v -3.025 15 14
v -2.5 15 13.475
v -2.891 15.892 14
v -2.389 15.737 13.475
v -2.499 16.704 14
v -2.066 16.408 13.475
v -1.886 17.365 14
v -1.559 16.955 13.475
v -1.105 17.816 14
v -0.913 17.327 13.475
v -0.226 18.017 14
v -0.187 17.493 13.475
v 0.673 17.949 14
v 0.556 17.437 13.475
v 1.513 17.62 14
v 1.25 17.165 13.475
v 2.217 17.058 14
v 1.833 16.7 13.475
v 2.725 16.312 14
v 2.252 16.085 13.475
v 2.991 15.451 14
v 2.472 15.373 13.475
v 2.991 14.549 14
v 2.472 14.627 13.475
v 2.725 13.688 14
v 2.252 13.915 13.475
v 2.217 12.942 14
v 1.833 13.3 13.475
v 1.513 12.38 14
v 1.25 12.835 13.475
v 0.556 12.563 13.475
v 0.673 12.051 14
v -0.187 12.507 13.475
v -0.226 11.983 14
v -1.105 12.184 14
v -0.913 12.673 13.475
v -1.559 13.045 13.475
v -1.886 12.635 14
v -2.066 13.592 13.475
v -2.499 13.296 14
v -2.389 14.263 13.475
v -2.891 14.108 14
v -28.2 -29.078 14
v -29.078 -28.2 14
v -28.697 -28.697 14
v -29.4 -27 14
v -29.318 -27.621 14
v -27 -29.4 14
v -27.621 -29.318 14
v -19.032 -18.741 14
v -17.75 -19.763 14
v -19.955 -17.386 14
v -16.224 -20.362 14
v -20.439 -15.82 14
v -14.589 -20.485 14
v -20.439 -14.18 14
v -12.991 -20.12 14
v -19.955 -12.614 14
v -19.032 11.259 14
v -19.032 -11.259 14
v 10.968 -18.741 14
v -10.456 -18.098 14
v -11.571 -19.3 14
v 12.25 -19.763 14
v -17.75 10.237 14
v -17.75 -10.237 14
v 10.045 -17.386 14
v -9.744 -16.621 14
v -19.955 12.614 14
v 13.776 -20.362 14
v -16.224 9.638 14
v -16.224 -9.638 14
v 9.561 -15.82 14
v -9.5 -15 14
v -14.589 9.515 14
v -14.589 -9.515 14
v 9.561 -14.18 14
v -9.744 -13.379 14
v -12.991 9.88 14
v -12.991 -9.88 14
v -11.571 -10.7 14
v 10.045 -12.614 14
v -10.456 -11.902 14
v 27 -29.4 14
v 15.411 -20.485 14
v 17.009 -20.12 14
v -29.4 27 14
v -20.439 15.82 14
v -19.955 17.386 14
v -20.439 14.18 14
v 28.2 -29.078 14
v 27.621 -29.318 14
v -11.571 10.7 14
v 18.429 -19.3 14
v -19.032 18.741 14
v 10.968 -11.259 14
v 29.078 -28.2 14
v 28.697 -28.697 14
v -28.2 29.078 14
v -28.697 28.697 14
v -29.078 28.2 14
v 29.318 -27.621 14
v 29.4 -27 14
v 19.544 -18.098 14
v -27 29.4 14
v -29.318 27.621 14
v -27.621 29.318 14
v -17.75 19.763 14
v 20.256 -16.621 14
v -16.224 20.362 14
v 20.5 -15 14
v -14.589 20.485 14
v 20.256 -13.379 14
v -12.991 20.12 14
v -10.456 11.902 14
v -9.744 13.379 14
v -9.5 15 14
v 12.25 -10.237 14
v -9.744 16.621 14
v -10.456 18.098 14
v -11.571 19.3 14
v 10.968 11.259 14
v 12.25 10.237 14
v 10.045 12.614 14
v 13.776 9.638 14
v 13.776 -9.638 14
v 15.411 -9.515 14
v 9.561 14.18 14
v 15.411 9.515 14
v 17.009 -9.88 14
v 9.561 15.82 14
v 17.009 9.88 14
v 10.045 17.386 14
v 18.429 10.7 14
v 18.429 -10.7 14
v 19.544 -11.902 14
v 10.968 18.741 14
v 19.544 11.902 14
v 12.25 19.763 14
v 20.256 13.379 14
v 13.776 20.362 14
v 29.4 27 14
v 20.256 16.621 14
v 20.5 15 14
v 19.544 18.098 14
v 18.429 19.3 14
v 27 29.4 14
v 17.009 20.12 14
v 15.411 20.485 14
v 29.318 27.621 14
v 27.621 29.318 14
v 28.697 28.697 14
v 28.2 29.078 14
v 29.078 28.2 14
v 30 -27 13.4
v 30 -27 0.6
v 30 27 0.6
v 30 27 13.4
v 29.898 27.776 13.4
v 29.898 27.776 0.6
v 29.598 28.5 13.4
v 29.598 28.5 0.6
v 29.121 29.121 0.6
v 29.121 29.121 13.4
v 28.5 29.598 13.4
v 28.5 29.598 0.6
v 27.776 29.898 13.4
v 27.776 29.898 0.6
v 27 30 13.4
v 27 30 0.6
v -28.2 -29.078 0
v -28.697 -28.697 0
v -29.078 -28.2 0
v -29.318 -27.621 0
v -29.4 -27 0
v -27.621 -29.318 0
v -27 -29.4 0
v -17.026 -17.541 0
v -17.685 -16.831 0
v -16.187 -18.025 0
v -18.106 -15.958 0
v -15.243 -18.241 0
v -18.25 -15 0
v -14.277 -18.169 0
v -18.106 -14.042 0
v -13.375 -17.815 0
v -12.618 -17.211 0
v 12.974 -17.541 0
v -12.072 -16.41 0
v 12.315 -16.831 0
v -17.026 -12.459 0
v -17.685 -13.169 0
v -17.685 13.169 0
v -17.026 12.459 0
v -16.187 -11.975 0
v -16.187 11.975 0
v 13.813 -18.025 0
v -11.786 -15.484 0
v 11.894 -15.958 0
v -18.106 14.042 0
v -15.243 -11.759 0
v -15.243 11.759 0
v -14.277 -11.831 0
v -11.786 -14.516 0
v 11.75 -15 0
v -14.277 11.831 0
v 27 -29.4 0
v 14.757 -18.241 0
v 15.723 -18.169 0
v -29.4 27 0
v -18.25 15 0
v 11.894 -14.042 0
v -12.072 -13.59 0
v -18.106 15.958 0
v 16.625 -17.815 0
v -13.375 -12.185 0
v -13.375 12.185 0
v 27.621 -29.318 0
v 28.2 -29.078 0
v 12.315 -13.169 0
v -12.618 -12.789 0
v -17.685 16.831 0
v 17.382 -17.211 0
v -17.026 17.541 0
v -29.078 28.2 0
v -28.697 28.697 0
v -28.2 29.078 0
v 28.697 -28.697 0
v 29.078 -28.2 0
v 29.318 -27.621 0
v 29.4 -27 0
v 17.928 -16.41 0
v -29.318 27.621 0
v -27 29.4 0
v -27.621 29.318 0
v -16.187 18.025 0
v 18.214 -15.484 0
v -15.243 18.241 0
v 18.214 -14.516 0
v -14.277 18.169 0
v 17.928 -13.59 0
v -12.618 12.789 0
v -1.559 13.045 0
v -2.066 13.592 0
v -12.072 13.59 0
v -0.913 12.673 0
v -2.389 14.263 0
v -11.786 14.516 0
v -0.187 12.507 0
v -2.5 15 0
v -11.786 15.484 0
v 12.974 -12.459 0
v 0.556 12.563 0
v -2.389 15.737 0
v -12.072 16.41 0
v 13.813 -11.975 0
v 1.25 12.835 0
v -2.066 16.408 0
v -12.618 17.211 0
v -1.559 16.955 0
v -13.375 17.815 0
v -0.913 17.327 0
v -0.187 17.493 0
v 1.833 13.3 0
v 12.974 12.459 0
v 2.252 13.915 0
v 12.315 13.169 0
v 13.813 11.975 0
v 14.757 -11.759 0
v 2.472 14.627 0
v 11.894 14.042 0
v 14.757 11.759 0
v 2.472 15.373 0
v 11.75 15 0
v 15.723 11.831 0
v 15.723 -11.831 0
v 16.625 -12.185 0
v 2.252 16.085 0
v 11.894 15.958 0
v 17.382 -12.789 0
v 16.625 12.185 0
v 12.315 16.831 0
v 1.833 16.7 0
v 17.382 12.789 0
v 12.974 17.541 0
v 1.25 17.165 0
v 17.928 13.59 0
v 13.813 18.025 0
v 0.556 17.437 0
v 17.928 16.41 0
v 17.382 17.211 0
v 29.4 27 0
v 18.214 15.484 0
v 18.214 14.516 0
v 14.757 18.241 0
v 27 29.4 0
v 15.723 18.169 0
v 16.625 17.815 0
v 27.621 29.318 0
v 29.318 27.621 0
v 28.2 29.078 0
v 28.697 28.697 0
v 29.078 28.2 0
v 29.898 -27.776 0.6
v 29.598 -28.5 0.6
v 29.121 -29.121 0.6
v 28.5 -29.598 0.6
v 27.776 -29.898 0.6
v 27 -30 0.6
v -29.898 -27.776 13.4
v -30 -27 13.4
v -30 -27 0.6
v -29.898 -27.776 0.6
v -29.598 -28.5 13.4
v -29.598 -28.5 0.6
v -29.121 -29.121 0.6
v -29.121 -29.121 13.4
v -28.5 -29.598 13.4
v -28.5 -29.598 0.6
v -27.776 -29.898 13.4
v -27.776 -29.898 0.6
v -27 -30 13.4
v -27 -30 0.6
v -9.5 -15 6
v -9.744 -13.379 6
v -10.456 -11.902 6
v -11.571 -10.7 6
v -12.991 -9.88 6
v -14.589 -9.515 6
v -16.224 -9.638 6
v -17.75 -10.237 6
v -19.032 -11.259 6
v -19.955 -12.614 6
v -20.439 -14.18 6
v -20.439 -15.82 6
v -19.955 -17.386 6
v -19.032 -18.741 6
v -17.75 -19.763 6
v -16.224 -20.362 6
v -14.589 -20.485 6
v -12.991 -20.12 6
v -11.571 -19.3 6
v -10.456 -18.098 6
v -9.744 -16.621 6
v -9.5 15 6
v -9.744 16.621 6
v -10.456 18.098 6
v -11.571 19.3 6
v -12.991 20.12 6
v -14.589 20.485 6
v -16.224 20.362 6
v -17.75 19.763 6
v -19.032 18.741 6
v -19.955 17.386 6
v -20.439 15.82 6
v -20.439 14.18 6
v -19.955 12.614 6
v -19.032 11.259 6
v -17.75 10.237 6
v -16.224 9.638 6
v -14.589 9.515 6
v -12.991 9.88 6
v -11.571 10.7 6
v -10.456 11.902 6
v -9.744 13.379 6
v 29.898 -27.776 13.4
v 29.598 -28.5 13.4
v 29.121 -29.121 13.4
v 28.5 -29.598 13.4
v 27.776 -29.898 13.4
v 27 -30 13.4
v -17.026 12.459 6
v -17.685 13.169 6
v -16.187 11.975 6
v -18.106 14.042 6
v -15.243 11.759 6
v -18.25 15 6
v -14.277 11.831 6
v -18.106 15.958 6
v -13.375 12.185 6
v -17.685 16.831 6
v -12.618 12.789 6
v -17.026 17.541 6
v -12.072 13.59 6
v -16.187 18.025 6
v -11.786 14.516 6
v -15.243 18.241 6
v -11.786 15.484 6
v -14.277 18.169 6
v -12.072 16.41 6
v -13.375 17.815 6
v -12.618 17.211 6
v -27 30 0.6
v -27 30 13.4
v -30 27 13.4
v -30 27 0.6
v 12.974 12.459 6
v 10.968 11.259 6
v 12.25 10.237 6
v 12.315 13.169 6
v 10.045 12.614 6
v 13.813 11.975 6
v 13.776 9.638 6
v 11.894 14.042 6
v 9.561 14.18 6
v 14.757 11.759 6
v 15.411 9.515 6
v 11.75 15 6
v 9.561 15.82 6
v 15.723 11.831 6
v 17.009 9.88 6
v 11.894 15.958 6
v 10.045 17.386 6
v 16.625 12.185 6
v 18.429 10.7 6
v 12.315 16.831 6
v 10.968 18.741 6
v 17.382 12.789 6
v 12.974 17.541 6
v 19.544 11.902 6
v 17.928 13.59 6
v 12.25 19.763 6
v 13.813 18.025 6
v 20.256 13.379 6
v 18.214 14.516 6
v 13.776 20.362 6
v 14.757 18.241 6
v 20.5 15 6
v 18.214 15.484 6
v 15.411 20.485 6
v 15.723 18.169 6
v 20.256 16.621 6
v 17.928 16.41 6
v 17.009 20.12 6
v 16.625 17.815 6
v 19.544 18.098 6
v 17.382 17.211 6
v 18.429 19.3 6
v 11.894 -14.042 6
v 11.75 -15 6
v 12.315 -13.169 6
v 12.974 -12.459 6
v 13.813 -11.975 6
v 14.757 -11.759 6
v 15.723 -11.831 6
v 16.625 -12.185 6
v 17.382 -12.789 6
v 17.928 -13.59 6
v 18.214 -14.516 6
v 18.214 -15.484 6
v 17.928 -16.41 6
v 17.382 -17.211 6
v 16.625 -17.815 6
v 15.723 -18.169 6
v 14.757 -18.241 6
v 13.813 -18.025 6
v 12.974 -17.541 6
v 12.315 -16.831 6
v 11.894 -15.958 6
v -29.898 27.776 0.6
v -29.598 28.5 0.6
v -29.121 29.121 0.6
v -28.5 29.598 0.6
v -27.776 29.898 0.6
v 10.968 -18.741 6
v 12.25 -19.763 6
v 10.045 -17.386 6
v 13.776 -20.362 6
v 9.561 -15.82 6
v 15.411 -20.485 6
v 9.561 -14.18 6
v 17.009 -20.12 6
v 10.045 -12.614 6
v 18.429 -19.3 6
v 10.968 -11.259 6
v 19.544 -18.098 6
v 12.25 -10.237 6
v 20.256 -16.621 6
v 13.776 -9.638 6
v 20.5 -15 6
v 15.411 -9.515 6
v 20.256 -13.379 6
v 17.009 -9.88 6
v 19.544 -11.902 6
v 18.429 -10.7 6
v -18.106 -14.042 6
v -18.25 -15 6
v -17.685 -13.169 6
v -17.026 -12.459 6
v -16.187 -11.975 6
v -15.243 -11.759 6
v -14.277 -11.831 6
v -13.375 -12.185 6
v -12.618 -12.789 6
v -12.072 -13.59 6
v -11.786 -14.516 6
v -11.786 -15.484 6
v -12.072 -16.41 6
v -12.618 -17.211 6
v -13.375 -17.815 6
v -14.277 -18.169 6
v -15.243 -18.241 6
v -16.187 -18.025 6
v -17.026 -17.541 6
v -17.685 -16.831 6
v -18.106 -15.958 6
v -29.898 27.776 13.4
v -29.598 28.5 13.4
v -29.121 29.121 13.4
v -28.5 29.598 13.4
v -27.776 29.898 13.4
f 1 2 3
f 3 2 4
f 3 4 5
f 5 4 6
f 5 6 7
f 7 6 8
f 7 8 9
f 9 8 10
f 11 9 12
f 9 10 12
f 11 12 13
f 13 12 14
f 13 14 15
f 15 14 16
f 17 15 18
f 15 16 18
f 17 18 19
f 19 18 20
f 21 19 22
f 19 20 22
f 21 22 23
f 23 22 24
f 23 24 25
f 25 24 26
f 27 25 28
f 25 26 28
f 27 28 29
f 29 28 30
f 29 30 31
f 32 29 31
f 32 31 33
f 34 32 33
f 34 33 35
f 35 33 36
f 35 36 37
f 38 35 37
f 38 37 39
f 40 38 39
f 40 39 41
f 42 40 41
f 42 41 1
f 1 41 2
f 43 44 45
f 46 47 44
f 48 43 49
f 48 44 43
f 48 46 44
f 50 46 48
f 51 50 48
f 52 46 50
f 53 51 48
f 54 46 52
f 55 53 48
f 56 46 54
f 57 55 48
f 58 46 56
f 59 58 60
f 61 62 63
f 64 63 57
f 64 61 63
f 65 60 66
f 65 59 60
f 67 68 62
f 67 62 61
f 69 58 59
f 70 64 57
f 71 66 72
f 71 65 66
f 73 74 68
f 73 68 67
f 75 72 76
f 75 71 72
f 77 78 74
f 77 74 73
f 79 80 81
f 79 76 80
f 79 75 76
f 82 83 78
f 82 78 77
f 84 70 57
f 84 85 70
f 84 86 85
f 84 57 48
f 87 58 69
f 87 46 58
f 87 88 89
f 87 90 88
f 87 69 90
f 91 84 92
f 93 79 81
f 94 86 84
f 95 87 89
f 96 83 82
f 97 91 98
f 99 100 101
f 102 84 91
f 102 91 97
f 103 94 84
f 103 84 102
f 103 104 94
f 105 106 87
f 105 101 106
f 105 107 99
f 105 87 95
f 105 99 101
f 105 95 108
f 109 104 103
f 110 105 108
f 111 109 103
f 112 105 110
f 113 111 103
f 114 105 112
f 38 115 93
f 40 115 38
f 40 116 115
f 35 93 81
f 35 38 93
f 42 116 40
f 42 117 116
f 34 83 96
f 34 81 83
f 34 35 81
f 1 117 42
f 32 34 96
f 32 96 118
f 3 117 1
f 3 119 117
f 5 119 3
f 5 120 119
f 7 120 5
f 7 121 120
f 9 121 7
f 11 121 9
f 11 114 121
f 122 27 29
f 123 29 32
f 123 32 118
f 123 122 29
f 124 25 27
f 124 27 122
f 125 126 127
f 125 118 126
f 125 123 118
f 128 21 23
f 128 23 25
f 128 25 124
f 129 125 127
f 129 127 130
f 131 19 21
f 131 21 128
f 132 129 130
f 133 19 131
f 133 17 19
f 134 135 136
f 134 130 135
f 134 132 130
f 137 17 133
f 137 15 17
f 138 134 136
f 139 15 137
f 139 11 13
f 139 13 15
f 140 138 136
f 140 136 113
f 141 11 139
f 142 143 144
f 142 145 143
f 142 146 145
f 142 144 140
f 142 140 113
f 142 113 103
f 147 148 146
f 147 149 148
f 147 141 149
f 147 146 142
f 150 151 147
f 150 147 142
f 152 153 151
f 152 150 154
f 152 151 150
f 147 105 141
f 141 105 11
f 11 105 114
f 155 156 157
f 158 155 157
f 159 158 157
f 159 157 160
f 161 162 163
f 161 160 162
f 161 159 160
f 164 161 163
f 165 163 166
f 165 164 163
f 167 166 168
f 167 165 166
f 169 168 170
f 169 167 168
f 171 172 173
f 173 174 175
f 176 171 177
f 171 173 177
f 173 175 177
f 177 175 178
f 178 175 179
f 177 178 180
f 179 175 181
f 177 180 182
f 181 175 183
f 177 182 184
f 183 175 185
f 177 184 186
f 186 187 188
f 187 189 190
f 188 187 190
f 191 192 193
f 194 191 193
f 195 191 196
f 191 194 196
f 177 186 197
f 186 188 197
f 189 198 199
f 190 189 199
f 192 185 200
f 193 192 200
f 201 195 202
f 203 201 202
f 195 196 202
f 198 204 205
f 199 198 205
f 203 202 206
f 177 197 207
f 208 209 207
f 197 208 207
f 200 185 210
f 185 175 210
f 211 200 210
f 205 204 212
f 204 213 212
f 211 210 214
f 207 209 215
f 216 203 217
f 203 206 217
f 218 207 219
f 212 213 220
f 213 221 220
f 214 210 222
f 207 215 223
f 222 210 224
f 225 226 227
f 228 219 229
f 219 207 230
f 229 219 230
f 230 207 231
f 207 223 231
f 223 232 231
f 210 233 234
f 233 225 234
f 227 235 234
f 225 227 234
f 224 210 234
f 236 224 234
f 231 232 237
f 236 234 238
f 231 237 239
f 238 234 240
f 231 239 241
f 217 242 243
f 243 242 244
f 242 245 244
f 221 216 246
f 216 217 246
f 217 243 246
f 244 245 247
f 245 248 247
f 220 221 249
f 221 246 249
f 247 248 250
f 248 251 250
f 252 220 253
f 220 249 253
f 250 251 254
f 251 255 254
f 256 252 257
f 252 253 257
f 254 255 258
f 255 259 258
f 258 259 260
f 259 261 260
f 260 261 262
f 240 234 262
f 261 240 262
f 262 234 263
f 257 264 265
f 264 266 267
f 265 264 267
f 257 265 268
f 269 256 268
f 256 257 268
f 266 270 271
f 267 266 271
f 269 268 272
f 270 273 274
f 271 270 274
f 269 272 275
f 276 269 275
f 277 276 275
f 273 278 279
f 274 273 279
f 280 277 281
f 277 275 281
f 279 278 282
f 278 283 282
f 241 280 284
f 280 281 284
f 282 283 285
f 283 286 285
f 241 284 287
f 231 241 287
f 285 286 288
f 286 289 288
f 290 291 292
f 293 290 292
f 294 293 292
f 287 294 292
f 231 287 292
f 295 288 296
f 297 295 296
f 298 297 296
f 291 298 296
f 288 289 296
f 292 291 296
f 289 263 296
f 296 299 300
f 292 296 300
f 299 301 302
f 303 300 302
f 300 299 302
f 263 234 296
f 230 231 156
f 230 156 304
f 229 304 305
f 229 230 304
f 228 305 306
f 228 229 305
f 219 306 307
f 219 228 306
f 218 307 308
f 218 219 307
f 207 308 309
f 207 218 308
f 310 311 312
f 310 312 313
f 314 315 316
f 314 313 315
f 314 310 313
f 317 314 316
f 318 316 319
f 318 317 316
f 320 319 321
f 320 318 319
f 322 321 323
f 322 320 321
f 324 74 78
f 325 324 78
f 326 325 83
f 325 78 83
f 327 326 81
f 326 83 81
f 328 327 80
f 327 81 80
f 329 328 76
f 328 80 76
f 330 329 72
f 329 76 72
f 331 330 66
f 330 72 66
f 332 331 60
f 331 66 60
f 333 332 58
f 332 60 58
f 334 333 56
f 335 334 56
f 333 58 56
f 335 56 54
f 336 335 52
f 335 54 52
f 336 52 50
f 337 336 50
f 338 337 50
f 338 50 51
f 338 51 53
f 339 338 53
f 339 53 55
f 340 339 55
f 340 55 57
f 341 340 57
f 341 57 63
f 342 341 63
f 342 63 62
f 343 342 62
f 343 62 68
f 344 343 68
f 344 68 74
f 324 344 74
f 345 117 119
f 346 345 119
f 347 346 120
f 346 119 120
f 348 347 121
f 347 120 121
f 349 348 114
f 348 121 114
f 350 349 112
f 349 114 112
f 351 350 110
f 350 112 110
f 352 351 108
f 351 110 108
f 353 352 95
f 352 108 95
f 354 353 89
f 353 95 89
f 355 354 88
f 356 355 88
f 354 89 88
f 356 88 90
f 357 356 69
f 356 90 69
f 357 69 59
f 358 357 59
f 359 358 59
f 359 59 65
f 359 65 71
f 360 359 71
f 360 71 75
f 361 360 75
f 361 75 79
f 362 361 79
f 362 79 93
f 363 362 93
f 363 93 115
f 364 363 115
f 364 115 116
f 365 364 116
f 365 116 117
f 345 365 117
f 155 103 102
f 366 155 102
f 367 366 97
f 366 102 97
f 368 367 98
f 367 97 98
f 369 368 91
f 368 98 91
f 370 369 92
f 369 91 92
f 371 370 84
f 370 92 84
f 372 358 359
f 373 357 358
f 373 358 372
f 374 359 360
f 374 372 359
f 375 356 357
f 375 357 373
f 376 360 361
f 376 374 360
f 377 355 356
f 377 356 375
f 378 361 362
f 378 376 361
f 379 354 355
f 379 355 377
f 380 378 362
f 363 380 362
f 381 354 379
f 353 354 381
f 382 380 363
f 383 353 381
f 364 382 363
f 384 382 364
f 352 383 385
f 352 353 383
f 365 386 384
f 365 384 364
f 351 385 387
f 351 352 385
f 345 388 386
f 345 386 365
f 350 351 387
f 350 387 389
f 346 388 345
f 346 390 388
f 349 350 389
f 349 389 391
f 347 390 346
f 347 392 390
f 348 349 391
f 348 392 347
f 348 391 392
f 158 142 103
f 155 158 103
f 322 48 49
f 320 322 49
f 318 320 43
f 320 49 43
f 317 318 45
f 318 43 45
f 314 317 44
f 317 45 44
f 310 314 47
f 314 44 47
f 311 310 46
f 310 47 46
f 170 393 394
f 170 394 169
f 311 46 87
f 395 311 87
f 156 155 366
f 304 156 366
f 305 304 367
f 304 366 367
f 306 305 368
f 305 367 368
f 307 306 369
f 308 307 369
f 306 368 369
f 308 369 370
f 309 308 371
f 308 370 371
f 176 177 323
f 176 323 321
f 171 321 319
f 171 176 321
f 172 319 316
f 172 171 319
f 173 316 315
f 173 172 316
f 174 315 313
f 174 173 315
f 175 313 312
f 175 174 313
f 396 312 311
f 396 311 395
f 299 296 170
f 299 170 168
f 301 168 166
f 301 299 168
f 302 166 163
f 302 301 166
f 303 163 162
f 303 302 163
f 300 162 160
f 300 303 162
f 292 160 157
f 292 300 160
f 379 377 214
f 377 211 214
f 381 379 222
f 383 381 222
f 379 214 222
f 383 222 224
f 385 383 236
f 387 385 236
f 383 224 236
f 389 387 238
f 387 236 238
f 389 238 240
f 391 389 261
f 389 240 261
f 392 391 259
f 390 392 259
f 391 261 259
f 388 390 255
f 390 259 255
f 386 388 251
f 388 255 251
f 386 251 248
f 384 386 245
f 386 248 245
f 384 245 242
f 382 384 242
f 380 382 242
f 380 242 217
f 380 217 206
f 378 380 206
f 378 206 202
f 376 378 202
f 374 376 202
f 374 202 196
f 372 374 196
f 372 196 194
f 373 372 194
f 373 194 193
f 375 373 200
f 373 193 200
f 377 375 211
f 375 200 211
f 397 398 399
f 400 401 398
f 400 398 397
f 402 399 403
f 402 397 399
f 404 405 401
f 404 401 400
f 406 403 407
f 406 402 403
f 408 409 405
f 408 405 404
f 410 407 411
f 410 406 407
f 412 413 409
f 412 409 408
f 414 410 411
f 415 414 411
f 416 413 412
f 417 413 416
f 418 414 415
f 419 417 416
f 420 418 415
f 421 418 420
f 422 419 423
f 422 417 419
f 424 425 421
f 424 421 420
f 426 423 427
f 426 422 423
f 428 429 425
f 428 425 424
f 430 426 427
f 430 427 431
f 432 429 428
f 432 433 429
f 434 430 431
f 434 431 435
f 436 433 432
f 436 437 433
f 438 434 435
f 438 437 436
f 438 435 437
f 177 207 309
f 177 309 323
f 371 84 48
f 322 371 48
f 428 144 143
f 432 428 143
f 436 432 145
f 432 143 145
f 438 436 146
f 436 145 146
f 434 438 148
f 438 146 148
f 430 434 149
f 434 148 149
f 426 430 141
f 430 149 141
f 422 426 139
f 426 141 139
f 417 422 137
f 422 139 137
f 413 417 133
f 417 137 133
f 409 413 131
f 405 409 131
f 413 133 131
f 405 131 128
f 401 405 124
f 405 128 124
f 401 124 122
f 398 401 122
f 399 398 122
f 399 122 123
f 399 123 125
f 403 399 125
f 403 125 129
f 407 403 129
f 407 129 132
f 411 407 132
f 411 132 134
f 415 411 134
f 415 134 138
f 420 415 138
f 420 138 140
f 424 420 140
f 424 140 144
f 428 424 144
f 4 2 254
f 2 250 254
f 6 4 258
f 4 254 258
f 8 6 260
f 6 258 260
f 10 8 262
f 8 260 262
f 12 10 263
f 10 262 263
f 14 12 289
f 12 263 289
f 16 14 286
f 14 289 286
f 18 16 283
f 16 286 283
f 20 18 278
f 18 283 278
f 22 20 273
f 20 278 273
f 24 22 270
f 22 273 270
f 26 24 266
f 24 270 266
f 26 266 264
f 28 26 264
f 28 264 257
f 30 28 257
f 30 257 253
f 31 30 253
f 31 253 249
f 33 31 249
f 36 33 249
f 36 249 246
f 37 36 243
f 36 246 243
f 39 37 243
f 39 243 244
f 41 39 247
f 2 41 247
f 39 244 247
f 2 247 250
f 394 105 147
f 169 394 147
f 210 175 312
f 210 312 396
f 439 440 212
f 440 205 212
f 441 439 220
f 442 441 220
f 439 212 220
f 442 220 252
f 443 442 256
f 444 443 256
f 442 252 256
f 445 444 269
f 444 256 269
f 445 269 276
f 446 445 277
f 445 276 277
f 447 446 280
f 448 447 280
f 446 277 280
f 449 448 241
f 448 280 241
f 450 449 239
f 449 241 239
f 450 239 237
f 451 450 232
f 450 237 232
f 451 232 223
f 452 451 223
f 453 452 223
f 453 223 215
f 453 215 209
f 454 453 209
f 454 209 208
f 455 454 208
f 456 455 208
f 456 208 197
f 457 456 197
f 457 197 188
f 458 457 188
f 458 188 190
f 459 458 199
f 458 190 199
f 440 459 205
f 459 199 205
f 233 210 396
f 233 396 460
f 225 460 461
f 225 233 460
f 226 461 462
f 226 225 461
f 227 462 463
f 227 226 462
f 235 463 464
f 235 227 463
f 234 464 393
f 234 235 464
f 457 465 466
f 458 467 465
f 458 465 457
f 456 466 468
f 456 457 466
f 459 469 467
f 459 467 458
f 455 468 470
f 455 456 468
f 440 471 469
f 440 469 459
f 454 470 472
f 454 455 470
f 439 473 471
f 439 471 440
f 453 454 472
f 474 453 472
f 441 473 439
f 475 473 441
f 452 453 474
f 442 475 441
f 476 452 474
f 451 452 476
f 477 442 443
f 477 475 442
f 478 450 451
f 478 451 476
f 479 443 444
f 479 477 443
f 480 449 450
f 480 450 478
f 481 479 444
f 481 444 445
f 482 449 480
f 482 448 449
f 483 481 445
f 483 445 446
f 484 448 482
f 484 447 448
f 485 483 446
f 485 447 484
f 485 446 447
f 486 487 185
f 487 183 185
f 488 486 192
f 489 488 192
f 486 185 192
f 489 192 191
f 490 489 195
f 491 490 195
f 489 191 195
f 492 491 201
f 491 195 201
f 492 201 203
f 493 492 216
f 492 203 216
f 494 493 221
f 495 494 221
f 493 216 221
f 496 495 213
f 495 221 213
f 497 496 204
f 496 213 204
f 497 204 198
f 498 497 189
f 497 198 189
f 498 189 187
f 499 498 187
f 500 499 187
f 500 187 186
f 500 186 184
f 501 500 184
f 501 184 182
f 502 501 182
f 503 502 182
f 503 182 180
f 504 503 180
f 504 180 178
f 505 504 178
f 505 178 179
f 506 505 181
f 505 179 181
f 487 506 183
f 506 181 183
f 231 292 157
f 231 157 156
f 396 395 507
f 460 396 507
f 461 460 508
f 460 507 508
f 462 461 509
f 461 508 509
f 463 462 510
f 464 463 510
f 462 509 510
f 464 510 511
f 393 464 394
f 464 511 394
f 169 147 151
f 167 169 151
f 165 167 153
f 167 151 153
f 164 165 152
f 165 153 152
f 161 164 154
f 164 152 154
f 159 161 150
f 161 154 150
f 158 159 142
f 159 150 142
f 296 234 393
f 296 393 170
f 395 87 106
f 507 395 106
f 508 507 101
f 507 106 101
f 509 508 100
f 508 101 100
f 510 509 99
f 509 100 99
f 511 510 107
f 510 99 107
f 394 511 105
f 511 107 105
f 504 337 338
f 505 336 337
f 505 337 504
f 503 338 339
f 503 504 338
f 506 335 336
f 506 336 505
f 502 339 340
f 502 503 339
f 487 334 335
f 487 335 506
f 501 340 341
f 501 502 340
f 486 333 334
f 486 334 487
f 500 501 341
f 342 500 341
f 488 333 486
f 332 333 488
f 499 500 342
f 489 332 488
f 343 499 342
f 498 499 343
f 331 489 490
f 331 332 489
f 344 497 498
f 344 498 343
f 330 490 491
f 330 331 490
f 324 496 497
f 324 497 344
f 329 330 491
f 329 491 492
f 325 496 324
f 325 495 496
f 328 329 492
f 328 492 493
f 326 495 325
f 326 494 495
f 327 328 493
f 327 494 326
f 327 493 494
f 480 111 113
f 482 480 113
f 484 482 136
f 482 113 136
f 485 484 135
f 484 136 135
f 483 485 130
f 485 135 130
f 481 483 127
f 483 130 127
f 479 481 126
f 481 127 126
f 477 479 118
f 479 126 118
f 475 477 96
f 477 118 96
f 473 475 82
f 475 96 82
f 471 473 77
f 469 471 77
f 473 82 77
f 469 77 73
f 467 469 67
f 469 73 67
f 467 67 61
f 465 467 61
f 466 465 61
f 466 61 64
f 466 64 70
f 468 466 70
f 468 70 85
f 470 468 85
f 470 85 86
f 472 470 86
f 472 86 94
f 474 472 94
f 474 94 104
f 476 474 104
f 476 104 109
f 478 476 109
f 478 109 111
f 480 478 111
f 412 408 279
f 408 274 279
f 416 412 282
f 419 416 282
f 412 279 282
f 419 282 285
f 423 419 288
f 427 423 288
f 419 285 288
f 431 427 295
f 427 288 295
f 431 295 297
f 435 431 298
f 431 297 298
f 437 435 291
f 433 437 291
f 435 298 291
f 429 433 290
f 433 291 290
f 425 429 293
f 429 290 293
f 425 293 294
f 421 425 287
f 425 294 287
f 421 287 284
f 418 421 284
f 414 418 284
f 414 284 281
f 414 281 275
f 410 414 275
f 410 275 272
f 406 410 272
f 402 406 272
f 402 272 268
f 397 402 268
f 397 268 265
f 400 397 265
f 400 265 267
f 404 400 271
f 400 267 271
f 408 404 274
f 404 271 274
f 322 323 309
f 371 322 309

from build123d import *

# Parameters (mm, degrees)
SKETCH1_W                                           = 60
SKETCH1_H                                           = 60
BOSS_EXTRUDE1_DEPTH                                 = 14
CBORE_FOR_M6_HEX_SOCKET_HEAD_CAP_SCREW1_D           = 6.5
CBORE_FOR_M6_HEX_SOCKET_HEAD_CAP_SCREW1_CBORE_D     = 11
CBORE_FOR_M6_HEX_SOCKET_HEAD_CAP_SCREW1_CBORE_DEPTH = 8
M6_TAPPED_HOLE1_D                                   = 5
M6_TAPPED_HOLE1_CSINK_D                             = 6.05
M6_TAPPED_HOLE1_CSINK_ANGLE                         = 90
FILLET1_R                                           = 3
CHAMFER1_SIZE                                       = 0.6


with BuildPart() as part:
    # Sketch1 → Boss-Extrude1 (new body)
    with BuildSketch(Plane.XY):
        Rectangle(SKETCH1_W, SKETCH1_H)
    extrude(amount=BOSS_EXTRUDE1_DEPTH)

    # CBORE for M6 Hex Socket Head Cap Screw1 (through all)
    with Locations(Plane.XY.offset(14)):
        with Locations((-15, 15), (15, 15), (15, -15), (-15, -15)):
            CounterBoreHole(CBORE_FOR_M6_HEX_SOCKET_HEAD_CAP_SCREW1_D / 2, CBORE_FOR_M6_HEX_SOCKET_HEAD_CAP_SCREW1_CBORE_D / 2, CBORE_FOR_M6_HEX_SOCKET_HEAD_CAP_SCREW1_CBORE_DEPTH)

    # M6 Tapped Hole1 (through all)
    with Locations(Plane.XY.offset(14)):
        with Locations((0, 15)):
            CounterSinkHole(M6_TAPPED_HOLE1_D / 2, M6_TAPPED_HOLE1_CSINK_D / 2, counter_sink_angle=M6_TAPPED_HOLE1_CSINK_ANGLE)

    # Fillet1
    fillet1_edges = [part.edges().sort_by_distance(p)[0] for p in [
        (-30, 30, 7),
        (30, 30, 7),
        (30, -30, 7),
        (-30, -30, 7),
    ]]
    fillet(fillet1_edges, radius=FILLET1_R)

    # Chamfer1
    chamfer1_edges = [part.edges().sort_by_distance(p)[0] for p in [
        (-30, 0, 0),
        (-30, 0, 14),
        (0, 30, 0),
        (30, 0, 0),
        (0, -30, 0),
        (-29.121320344, -29.121320344, 0),
        (29.121320344, -29.121320344, 0),
        (29.121320344, 29.121320344, 0),
        (-29.121320344, 29.121320344, 0),
        (0, 30, 14),
        (0, -30, 14),
        (30, 0, 14),
        (-29.121320344, -29.121320344, 14),
        (29.121320344, -29.121320344, 14),
        (29.121320344, 29.121320344, 14),
        (-29.121320344, 29.121320344, 14),
    ]]
    chamfer(chamfer1_edges, length=CHAMFER1_SIZE)


solid = part.part
